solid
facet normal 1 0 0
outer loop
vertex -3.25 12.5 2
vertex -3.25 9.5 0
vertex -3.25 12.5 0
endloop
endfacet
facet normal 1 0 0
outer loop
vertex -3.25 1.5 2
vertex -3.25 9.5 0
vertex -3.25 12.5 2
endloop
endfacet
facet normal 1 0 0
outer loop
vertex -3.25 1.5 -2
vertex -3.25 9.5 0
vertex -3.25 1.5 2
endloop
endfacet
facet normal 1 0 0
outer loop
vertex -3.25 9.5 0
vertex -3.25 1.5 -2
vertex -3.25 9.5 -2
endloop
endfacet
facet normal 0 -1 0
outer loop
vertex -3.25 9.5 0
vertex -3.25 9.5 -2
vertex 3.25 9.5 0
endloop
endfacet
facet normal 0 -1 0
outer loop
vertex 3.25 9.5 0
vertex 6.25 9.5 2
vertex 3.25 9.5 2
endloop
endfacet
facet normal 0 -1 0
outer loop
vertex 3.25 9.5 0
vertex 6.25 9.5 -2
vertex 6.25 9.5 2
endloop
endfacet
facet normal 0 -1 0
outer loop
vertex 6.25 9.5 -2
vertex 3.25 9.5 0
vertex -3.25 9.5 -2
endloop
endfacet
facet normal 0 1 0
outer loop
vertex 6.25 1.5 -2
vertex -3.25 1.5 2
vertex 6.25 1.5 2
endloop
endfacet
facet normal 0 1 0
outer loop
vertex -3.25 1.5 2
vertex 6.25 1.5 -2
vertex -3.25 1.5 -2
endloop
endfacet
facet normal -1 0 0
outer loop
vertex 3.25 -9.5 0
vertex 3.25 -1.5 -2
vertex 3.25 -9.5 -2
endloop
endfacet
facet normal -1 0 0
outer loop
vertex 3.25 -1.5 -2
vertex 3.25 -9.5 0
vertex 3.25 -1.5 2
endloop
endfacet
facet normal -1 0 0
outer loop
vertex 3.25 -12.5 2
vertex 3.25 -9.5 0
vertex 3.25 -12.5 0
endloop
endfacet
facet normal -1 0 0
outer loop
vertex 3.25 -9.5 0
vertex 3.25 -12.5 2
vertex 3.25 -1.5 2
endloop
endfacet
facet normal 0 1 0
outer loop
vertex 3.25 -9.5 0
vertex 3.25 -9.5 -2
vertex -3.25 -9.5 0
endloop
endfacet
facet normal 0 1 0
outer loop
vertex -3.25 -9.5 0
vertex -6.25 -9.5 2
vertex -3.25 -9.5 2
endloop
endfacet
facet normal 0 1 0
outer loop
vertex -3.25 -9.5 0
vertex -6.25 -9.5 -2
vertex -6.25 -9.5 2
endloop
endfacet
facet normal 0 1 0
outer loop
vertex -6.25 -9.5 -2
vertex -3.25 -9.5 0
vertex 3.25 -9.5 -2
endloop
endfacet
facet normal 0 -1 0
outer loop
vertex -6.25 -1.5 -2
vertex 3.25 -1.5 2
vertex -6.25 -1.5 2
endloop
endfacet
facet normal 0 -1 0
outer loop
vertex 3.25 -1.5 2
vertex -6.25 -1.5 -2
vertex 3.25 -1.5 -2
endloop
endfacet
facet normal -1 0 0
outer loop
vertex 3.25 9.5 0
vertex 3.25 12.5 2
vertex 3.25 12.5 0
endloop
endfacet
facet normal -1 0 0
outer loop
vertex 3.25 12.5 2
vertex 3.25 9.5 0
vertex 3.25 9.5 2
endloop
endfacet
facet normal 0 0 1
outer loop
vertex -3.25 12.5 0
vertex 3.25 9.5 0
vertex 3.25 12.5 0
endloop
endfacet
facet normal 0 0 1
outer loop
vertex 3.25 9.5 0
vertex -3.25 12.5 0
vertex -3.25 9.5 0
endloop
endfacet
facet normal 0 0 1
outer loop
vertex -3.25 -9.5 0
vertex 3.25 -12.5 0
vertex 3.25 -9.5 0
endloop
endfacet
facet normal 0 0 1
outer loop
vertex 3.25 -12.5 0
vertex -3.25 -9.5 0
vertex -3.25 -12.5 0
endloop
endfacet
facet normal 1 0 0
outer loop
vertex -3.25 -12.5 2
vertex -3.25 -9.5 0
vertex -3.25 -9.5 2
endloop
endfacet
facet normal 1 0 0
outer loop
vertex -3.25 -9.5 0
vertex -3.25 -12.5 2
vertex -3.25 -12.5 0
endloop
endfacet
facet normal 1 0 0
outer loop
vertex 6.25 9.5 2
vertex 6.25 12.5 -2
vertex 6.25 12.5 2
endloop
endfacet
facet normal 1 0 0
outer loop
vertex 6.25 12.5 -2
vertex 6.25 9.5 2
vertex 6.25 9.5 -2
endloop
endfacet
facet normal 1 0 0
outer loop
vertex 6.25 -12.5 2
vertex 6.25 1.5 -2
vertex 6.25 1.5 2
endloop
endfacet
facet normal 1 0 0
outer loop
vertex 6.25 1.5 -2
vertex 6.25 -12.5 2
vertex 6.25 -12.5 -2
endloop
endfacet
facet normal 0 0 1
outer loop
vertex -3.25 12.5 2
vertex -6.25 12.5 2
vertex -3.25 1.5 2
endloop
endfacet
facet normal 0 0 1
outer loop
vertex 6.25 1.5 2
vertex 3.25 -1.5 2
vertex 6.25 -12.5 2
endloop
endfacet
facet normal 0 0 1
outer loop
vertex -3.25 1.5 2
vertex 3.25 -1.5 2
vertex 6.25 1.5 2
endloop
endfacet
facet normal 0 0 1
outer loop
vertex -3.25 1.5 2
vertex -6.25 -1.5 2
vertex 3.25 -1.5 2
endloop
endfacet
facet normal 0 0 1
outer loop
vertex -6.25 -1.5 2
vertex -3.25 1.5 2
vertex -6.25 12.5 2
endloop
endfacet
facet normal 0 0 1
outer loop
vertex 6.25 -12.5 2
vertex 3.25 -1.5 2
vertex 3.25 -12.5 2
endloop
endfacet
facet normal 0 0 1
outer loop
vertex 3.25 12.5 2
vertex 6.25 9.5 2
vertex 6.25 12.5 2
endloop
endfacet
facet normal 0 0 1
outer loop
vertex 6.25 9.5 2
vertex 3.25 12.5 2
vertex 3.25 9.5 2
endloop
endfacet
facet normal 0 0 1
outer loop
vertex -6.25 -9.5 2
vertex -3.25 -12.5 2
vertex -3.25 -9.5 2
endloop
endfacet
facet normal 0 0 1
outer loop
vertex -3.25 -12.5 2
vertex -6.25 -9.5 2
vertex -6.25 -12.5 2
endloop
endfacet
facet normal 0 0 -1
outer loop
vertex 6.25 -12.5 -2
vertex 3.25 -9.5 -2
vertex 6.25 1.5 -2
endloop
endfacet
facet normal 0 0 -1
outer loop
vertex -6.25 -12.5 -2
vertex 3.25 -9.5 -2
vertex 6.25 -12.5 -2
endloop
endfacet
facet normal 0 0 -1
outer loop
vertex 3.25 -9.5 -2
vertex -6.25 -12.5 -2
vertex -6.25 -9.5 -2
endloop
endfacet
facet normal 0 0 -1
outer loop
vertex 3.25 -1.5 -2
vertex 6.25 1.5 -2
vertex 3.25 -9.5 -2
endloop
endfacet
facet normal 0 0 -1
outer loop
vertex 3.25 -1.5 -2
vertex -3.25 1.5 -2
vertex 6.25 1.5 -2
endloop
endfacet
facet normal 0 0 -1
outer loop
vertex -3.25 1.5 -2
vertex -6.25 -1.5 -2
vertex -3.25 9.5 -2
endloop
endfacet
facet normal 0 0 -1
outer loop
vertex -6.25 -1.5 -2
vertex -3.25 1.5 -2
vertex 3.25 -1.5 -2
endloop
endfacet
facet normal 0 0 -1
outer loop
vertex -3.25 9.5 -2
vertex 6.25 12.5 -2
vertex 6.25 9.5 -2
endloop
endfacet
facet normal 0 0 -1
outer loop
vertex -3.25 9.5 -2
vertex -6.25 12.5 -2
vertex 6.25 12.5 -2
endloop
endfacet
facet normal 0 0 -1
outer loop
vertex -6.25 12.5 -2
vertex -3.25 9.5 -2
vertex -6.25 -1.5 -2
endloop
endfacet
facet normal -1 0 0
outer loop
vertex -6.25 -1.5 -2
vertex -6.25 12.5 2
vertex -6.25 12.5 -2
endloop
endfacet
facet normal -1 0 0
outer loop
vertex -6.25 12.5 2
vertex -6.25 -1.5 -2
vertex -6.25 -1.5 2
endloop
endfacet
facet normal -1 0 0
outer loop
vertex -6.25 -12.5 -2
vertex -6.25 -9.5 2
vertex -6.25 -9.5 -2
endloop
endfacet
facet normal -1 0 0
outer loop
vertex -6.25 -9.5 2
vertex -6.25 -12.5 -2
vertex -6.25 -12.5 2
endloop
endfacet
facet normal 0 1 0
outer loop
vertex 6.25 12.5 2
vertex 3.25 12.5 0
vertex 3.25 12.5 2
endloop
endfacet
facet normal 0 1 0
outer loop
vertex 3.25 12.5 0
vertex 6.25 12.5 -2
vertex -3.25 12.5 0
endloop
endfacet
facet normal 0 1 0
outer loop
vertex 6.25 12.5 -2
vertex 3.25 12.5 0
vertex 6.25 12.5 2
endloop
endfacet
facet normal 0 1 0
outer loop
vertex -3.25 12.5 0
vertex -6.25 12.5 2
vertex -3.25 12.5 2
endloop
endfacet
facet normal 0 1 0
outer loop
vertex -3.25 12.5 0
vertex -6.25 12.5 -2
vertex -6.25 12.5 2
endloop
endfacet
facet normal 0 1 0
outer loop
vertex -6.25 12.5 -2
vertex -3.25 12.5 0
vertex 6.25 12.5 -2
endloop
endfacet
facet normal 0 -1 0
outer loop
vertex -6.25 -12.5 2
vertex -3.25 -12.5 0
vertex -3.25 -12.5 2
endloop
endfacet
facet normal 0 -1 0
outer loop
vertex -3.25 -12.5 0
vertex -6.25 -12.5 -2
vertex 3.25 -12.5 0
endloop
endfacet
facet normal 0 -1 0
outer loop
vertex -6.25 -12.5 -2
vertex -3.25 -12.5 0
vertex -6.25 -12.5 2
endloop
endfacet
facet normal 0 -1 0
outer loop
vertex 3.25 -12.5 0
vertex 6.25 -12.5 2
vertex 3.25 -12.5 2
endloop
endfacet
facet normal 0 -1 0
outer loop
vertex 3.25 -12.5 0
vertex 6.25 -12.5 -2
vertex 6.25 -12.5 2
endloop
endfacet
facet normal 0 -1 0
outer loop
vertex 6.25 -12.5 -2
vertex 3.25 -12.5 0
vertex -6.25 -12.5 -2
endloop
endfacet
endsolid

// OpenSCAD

// 
// source: http://www.thingiverse.com/thing:10082
// made for customizer
// alexander@nischelwitzer.com
//


  //////////////////////////
 // Customizer Settings: //
//////////////////////////

// How long should the belt-tension be? (mm)
tensionLength   = 25;  // [20:50]

// How thick should the tension be? (mm) 
tensionThick = 4; // [2:10]

// How large is the belt width? (1/10 mm)
beltWidth = 65; // [30:100]


// How deep is the notch? (mm)
notchDepth = 2; // [1:10]

  //////////////////////
 // Static Settings: //
//////////////////////

module GoAwayCustomizer() {
// This module is here to stop Customizer from picking up the variables below
}

// ---------------------------------------------------


beltTensioner(beltWidth/10, 3, tensionLength, tensionThick, notchDepth);



module beltTensioner(belt_width, post_width, length, thickness, notch_depth)
{
	module _beltTensioner(width, length, thickness, post_width, notch_depth)
	{
		cutout_width = width - post_width + 2;
		cutout_length = (length - post_width * 3) / 2;
		cutout_thickness = thickness + 6;

		notch_width = width - post_width * 2;
		module cutout()
		{
			translate([post_width / 2 + 1, length / 2 - cutout_length / 2 - post_width, 0])
			{
				cube([cutout_width, cutout_length, cutout_thickness], center=true);
			}
		}
	
		module notch_cutout()
		{
			translate([0,  length / 2 - post_width / 2, thickness / 2 - notch_depth / 2 + 1])
			{
				cube([notch_width, post_width + 2, notch_depth + 2], center= true);
			}
		}
		difference()
		{
			// Main body	
			cube([width, length, thickness], center=true);
	
			// Notches for "S" shape
			union()
			{
					cutout ();
					mirror([1, 0, 0])
					{
						mirror([0, 1, 0])
						{
							cutout ();
						}
					}
	
					// Notches for belt guide
					notch_cutout();
					mirror([0, 1, 0])
					{
						notch_cutout();
					}
			}
		}
	}
	_beltTensioner(belt_width + post_width * 2, length, thickness, post_width, notch_depth);
}


